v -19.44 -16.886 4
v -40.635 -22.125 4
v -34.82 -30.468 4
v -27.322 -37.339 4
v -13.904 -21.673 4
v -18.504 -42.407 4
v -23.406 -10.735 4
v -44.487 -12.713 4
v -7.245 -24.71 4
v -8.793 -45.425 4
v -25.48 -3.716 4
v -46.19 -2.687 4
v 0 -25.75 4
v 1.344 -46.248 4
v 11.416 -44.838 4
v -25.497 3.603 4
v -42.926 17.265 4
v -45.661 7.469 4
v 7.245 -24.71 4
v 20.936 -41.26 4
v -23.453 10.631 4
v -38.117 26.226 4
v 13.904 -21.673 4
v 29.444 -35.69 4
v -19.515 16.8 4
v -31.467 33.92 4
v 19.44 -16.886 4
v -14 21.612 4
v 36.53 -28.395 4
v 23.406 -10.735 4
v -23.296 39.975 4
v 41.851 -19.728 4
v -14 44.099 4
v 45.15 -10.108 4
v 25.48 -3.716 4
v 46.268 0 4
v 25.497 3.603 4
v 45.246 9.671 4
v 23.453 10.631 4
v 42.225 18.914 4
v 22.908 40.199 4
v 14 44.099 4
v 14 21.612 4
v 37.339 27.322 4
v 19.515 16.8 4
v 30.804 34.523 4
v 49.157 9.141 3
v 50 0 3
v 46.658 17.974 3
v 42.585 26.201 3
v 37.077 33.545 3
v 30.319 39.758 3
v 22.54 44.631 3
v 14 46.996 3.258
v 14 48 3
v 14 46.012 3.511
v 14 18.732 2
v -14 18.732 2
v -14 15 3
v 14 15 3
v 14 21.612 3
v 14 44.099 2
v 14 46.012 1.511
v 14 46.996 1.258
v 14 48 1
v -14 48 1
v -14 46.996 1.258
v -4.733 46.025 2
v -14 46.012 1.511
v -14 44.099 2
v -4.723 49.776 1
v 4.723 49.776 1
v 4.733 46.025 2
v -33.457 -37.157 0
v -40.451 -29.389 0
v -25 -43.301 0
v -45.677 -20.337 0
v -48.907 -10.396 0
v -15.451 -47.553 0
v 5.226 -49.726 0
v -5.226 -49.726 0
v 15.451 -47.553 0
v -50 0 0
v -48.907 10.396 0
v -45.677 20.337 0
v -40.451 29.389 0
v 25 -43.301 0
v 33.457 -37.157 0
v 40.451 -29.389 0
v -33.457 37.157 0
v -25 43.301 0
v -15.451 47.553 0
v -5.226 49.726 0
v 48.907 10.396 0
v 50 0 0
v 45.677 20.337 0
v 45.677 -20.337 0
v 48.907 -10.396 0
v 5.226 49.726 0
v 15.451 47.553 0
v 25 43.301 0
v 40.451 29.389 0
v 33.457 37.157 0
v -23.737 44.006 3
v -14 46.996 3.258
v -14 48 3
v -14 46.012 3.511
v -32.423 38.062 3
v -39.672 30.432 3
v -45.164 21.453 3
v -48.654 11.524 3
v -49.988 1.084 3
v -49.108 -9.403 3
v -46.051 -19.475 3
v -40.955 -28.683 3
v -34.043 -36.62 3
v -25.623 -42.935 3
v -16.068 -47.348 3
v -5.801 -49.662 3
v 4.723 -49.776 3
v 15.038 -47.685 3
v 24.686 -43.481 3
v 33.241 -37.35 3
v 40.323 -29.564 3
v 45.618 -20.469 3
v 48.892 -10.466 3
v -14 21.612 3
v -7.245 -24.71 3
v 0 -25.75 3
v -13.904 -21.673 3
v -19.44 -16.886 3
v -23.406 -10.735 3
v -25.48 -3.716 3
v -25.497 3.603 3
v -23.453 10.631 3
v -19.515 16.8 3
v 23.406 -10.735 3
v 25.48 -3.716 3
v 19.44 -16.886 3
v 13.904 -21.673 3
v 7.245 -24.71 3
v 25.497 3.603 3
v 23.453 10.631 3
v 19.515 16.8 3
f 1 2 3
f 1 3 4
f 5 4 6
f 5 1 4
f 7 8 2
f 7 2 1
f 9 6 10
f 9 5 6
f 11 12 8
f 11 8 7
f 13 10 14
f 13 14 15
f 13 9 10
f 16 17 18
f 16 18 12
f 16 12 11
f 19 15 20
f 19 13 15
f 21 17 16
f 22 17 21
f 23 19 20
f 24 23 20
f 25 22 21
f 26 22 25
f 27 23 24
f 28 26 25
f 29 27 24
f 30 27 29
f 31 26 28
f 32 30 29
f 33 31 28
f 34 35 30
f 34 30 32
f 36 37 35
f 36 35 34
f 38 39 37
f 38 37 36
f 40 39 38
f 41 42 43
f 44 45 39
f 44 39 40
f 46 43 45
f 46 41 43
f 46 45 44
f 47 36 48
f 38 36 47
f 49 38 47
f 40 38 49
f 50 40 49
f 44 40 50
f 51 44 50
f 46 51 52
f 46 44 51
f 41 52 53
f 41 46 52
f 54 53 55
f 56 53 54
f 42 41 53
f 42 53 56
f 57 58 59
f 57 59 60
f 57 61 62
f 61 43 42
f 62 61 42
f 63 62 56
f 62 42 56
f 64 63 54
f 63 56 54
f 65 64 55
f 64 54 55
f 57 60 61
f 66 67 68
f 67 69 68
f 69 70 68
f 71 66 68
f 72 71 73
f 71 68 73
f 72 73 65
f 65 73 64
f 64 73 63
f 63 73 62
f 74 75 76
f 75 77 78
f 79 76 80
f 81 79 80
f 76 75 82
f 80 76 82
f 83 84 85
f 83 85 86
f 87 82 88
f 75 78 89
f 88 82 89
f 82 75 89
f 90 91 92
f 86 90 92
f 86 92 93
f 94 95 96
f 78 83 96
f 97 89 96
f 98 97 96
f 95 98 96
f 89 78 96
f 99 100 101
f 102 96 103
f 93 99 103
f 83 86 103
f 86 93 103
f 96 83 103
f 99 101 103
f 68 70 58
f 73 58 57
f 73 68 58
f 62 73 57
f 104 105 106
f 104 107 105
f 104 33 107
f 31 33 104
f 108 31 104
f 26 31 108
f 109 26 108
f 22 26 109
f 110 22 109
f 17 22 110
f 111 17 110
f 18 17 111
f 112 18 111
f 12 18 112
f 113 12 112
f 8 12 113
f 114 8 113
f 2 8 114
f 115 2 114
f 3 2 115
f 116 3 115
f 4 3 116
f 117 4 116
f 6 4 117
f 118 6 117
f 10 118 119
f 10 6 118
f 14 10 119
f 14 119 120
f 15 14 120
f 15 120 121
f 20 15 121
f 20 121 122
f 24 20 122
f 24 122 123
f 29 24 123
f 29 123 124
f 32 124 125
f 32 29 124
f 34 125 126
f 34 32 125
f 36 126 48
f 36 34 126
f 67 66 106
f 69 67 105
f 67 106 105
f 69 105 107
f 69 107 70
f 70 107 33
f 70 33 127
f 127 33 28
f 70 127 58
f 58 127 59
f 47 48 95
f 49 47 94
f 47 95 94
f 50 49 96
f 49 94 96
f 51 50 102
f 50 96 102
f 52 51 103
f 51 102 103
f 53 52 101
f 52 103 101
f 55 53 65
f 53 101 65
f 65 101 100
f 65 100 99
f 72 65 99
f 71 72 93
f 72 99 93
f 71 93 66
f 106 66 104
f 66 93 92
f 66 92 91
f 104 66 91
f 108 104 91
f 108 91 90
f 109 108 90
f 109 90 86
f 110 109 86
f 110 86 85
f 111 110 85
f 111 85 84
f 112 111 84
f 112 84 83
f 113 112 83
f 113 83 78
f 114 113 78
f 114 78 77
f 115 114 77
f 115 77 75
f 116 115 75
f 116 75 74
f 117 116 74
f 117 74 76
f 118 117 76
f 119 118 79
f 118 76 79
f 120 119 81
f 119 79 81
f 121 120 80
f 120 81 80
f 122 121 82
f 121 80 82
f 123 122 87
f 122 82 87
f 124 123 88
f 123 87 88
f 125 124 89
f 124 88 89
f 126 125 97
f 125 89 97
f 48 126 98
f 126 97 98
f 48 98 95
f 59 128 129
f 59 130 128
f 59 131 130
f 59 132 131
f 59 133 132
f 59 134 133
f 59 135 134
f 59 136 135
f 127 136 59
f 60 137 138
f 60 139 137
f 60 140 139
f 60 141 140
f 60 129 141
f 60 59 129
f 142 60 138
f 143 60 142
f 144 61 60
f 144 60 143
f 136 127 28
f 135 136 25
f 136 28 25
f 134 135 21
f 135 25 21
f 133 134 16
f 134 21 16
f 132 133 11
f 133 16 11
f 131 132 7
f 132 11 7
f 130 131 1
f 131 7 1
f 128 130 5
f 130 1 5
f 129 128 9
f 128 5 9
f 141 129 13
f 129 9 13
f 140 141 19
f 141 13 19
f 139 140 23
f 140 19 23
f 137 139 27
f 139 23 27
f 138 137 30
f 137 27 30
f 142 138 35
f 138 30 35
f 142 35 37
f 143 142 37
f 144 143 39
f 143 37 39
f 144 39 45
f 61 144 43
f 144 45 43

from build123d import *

# Parameters (mm, degrees)
F0_R     = 50
F1_DEPTH = 4
F2_R     = 25.75
F3_DEPTH = 1
F5_DEPTH = 2
F6_SIZE2 = 3.732041
F6_SIZE  = 0.99999


# Not quite as in the source:
# - a fillet or chamfer is up to 0.001 mm smaller than in the source, because OpenCascade refuses the exact size
# - a feature names something its author has since deleted; it is built from what else it names


with BuildPart() as f1:
    # F0 (on Top) → F1 (new body)
    with BuildSketch(Plane.XY):
        Circle(F0_R)
    extrude(amount=F1_DEPTH)

    # F2 (on face) → F3 (cut)
    with BuildSketch(Plane.XY.offset(4)):
        Circle(F2_R)
    extrude(amount=-F3_DEPTH, mode=Mode.SUBTRACT)

    # F4 (on face) → F5 (cut)
    with BuildSketch(Plane.XY.offset(4)):
        with BuildLine():
            Line((-14, 21.6116288141), (-14, 15))
            Line((-14, 15), (14, 15))
            Line((14, 15), (14, 21.6116288141))
            ThreePointArc((14, 21.6116288141), (0, 25.75), (-14, 21.6116288141))
        make_face()
        with BuildLine():
            Line((-14, 48), (-14, 21.6116288141))
            ThreePointArc((-14, 21.6116288141), (0, 25.75), (14, 21.6116288141))
            Line((14, 21.6116288141), (14, 48))
            ThreePointArc((14, 48), (0, 50), (-14, 48))
        make_face()
        with BuildLine():
            Line((-14, 55), (-14, 48))
            ThreePointArc((-14, 48), (0, 50), (14, 48))
            Line((14, 48), (14, 55))
            Line((14, 55), (-14, 55))
        make_face()
    extrude(amount=-F5_DEPTH, mode=Mode.SUBTRACT)

    # F6 (size 1 and 3.7320508076 in the source; OpenCascade refuses exactly that, so slightly less here)
    f6_edges = [f1.edges().sort_by_distance(p)[0] for p in [
        (0, 15, 2),
        (-30, -40, 4),
        (0, 50, 2),
        (40, 30, 4),
    ]]
    chamfer(f6_edges, length=F6_SIZE, length2=F6_SIZE2)


solid = f1.part
